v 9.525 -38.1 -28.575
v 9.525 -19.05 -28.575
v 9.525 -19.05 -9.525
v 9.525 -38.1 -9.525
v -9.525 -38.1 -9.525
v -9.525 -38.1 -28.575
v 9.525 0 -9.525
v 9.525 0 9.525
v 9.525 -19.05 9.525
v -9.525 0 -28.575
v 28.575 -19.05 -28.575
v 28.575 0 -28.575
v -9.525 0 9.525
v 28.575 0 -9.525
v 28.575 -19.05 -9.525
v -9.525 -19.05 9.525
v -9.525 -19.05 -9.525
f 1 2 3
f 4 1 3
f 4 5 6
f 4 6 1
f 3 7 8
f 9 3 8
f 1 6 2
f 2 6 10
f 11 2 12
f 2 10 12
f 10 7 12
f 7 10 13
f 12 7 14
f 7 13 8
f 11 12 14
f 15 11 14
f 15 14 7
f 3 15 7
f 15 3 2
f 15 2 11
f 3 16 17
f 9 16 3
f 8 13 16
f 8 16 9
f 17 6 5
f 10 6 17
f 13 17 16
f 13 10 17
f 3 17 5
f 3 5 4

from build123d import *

# Parameters (mm, degrees)
F0_W     = 19.05
F0_H     = 19.05
F1_DEPTH = 19.05
F2_W     = 19.05
F2_H     = 19.05
F3_DEPTH = 19.05


with BuildPart() as f1:
    # F0 (on Front) → F1 (new body)
    with BuildSketch(Plane.XZ):
        Rectangle(F0_W, F0_H)
        Polygon((28.575, -9.525), (9.525, -9.525), (-9.525, -9.525), (-9.525, -28.575), (28.575, -28.575), align=None)
    extrude(amount=F1_DEPTH)

    # F2 (on face) → F3 (join)
    with BuildSketch(Plane.XZ.offset(19.05)):
        with Locations((0, -19.05)):
            Rectangle(F2_W, F2_H)
    extrude(amount=F3_DEPTH)


solid = f1.part
